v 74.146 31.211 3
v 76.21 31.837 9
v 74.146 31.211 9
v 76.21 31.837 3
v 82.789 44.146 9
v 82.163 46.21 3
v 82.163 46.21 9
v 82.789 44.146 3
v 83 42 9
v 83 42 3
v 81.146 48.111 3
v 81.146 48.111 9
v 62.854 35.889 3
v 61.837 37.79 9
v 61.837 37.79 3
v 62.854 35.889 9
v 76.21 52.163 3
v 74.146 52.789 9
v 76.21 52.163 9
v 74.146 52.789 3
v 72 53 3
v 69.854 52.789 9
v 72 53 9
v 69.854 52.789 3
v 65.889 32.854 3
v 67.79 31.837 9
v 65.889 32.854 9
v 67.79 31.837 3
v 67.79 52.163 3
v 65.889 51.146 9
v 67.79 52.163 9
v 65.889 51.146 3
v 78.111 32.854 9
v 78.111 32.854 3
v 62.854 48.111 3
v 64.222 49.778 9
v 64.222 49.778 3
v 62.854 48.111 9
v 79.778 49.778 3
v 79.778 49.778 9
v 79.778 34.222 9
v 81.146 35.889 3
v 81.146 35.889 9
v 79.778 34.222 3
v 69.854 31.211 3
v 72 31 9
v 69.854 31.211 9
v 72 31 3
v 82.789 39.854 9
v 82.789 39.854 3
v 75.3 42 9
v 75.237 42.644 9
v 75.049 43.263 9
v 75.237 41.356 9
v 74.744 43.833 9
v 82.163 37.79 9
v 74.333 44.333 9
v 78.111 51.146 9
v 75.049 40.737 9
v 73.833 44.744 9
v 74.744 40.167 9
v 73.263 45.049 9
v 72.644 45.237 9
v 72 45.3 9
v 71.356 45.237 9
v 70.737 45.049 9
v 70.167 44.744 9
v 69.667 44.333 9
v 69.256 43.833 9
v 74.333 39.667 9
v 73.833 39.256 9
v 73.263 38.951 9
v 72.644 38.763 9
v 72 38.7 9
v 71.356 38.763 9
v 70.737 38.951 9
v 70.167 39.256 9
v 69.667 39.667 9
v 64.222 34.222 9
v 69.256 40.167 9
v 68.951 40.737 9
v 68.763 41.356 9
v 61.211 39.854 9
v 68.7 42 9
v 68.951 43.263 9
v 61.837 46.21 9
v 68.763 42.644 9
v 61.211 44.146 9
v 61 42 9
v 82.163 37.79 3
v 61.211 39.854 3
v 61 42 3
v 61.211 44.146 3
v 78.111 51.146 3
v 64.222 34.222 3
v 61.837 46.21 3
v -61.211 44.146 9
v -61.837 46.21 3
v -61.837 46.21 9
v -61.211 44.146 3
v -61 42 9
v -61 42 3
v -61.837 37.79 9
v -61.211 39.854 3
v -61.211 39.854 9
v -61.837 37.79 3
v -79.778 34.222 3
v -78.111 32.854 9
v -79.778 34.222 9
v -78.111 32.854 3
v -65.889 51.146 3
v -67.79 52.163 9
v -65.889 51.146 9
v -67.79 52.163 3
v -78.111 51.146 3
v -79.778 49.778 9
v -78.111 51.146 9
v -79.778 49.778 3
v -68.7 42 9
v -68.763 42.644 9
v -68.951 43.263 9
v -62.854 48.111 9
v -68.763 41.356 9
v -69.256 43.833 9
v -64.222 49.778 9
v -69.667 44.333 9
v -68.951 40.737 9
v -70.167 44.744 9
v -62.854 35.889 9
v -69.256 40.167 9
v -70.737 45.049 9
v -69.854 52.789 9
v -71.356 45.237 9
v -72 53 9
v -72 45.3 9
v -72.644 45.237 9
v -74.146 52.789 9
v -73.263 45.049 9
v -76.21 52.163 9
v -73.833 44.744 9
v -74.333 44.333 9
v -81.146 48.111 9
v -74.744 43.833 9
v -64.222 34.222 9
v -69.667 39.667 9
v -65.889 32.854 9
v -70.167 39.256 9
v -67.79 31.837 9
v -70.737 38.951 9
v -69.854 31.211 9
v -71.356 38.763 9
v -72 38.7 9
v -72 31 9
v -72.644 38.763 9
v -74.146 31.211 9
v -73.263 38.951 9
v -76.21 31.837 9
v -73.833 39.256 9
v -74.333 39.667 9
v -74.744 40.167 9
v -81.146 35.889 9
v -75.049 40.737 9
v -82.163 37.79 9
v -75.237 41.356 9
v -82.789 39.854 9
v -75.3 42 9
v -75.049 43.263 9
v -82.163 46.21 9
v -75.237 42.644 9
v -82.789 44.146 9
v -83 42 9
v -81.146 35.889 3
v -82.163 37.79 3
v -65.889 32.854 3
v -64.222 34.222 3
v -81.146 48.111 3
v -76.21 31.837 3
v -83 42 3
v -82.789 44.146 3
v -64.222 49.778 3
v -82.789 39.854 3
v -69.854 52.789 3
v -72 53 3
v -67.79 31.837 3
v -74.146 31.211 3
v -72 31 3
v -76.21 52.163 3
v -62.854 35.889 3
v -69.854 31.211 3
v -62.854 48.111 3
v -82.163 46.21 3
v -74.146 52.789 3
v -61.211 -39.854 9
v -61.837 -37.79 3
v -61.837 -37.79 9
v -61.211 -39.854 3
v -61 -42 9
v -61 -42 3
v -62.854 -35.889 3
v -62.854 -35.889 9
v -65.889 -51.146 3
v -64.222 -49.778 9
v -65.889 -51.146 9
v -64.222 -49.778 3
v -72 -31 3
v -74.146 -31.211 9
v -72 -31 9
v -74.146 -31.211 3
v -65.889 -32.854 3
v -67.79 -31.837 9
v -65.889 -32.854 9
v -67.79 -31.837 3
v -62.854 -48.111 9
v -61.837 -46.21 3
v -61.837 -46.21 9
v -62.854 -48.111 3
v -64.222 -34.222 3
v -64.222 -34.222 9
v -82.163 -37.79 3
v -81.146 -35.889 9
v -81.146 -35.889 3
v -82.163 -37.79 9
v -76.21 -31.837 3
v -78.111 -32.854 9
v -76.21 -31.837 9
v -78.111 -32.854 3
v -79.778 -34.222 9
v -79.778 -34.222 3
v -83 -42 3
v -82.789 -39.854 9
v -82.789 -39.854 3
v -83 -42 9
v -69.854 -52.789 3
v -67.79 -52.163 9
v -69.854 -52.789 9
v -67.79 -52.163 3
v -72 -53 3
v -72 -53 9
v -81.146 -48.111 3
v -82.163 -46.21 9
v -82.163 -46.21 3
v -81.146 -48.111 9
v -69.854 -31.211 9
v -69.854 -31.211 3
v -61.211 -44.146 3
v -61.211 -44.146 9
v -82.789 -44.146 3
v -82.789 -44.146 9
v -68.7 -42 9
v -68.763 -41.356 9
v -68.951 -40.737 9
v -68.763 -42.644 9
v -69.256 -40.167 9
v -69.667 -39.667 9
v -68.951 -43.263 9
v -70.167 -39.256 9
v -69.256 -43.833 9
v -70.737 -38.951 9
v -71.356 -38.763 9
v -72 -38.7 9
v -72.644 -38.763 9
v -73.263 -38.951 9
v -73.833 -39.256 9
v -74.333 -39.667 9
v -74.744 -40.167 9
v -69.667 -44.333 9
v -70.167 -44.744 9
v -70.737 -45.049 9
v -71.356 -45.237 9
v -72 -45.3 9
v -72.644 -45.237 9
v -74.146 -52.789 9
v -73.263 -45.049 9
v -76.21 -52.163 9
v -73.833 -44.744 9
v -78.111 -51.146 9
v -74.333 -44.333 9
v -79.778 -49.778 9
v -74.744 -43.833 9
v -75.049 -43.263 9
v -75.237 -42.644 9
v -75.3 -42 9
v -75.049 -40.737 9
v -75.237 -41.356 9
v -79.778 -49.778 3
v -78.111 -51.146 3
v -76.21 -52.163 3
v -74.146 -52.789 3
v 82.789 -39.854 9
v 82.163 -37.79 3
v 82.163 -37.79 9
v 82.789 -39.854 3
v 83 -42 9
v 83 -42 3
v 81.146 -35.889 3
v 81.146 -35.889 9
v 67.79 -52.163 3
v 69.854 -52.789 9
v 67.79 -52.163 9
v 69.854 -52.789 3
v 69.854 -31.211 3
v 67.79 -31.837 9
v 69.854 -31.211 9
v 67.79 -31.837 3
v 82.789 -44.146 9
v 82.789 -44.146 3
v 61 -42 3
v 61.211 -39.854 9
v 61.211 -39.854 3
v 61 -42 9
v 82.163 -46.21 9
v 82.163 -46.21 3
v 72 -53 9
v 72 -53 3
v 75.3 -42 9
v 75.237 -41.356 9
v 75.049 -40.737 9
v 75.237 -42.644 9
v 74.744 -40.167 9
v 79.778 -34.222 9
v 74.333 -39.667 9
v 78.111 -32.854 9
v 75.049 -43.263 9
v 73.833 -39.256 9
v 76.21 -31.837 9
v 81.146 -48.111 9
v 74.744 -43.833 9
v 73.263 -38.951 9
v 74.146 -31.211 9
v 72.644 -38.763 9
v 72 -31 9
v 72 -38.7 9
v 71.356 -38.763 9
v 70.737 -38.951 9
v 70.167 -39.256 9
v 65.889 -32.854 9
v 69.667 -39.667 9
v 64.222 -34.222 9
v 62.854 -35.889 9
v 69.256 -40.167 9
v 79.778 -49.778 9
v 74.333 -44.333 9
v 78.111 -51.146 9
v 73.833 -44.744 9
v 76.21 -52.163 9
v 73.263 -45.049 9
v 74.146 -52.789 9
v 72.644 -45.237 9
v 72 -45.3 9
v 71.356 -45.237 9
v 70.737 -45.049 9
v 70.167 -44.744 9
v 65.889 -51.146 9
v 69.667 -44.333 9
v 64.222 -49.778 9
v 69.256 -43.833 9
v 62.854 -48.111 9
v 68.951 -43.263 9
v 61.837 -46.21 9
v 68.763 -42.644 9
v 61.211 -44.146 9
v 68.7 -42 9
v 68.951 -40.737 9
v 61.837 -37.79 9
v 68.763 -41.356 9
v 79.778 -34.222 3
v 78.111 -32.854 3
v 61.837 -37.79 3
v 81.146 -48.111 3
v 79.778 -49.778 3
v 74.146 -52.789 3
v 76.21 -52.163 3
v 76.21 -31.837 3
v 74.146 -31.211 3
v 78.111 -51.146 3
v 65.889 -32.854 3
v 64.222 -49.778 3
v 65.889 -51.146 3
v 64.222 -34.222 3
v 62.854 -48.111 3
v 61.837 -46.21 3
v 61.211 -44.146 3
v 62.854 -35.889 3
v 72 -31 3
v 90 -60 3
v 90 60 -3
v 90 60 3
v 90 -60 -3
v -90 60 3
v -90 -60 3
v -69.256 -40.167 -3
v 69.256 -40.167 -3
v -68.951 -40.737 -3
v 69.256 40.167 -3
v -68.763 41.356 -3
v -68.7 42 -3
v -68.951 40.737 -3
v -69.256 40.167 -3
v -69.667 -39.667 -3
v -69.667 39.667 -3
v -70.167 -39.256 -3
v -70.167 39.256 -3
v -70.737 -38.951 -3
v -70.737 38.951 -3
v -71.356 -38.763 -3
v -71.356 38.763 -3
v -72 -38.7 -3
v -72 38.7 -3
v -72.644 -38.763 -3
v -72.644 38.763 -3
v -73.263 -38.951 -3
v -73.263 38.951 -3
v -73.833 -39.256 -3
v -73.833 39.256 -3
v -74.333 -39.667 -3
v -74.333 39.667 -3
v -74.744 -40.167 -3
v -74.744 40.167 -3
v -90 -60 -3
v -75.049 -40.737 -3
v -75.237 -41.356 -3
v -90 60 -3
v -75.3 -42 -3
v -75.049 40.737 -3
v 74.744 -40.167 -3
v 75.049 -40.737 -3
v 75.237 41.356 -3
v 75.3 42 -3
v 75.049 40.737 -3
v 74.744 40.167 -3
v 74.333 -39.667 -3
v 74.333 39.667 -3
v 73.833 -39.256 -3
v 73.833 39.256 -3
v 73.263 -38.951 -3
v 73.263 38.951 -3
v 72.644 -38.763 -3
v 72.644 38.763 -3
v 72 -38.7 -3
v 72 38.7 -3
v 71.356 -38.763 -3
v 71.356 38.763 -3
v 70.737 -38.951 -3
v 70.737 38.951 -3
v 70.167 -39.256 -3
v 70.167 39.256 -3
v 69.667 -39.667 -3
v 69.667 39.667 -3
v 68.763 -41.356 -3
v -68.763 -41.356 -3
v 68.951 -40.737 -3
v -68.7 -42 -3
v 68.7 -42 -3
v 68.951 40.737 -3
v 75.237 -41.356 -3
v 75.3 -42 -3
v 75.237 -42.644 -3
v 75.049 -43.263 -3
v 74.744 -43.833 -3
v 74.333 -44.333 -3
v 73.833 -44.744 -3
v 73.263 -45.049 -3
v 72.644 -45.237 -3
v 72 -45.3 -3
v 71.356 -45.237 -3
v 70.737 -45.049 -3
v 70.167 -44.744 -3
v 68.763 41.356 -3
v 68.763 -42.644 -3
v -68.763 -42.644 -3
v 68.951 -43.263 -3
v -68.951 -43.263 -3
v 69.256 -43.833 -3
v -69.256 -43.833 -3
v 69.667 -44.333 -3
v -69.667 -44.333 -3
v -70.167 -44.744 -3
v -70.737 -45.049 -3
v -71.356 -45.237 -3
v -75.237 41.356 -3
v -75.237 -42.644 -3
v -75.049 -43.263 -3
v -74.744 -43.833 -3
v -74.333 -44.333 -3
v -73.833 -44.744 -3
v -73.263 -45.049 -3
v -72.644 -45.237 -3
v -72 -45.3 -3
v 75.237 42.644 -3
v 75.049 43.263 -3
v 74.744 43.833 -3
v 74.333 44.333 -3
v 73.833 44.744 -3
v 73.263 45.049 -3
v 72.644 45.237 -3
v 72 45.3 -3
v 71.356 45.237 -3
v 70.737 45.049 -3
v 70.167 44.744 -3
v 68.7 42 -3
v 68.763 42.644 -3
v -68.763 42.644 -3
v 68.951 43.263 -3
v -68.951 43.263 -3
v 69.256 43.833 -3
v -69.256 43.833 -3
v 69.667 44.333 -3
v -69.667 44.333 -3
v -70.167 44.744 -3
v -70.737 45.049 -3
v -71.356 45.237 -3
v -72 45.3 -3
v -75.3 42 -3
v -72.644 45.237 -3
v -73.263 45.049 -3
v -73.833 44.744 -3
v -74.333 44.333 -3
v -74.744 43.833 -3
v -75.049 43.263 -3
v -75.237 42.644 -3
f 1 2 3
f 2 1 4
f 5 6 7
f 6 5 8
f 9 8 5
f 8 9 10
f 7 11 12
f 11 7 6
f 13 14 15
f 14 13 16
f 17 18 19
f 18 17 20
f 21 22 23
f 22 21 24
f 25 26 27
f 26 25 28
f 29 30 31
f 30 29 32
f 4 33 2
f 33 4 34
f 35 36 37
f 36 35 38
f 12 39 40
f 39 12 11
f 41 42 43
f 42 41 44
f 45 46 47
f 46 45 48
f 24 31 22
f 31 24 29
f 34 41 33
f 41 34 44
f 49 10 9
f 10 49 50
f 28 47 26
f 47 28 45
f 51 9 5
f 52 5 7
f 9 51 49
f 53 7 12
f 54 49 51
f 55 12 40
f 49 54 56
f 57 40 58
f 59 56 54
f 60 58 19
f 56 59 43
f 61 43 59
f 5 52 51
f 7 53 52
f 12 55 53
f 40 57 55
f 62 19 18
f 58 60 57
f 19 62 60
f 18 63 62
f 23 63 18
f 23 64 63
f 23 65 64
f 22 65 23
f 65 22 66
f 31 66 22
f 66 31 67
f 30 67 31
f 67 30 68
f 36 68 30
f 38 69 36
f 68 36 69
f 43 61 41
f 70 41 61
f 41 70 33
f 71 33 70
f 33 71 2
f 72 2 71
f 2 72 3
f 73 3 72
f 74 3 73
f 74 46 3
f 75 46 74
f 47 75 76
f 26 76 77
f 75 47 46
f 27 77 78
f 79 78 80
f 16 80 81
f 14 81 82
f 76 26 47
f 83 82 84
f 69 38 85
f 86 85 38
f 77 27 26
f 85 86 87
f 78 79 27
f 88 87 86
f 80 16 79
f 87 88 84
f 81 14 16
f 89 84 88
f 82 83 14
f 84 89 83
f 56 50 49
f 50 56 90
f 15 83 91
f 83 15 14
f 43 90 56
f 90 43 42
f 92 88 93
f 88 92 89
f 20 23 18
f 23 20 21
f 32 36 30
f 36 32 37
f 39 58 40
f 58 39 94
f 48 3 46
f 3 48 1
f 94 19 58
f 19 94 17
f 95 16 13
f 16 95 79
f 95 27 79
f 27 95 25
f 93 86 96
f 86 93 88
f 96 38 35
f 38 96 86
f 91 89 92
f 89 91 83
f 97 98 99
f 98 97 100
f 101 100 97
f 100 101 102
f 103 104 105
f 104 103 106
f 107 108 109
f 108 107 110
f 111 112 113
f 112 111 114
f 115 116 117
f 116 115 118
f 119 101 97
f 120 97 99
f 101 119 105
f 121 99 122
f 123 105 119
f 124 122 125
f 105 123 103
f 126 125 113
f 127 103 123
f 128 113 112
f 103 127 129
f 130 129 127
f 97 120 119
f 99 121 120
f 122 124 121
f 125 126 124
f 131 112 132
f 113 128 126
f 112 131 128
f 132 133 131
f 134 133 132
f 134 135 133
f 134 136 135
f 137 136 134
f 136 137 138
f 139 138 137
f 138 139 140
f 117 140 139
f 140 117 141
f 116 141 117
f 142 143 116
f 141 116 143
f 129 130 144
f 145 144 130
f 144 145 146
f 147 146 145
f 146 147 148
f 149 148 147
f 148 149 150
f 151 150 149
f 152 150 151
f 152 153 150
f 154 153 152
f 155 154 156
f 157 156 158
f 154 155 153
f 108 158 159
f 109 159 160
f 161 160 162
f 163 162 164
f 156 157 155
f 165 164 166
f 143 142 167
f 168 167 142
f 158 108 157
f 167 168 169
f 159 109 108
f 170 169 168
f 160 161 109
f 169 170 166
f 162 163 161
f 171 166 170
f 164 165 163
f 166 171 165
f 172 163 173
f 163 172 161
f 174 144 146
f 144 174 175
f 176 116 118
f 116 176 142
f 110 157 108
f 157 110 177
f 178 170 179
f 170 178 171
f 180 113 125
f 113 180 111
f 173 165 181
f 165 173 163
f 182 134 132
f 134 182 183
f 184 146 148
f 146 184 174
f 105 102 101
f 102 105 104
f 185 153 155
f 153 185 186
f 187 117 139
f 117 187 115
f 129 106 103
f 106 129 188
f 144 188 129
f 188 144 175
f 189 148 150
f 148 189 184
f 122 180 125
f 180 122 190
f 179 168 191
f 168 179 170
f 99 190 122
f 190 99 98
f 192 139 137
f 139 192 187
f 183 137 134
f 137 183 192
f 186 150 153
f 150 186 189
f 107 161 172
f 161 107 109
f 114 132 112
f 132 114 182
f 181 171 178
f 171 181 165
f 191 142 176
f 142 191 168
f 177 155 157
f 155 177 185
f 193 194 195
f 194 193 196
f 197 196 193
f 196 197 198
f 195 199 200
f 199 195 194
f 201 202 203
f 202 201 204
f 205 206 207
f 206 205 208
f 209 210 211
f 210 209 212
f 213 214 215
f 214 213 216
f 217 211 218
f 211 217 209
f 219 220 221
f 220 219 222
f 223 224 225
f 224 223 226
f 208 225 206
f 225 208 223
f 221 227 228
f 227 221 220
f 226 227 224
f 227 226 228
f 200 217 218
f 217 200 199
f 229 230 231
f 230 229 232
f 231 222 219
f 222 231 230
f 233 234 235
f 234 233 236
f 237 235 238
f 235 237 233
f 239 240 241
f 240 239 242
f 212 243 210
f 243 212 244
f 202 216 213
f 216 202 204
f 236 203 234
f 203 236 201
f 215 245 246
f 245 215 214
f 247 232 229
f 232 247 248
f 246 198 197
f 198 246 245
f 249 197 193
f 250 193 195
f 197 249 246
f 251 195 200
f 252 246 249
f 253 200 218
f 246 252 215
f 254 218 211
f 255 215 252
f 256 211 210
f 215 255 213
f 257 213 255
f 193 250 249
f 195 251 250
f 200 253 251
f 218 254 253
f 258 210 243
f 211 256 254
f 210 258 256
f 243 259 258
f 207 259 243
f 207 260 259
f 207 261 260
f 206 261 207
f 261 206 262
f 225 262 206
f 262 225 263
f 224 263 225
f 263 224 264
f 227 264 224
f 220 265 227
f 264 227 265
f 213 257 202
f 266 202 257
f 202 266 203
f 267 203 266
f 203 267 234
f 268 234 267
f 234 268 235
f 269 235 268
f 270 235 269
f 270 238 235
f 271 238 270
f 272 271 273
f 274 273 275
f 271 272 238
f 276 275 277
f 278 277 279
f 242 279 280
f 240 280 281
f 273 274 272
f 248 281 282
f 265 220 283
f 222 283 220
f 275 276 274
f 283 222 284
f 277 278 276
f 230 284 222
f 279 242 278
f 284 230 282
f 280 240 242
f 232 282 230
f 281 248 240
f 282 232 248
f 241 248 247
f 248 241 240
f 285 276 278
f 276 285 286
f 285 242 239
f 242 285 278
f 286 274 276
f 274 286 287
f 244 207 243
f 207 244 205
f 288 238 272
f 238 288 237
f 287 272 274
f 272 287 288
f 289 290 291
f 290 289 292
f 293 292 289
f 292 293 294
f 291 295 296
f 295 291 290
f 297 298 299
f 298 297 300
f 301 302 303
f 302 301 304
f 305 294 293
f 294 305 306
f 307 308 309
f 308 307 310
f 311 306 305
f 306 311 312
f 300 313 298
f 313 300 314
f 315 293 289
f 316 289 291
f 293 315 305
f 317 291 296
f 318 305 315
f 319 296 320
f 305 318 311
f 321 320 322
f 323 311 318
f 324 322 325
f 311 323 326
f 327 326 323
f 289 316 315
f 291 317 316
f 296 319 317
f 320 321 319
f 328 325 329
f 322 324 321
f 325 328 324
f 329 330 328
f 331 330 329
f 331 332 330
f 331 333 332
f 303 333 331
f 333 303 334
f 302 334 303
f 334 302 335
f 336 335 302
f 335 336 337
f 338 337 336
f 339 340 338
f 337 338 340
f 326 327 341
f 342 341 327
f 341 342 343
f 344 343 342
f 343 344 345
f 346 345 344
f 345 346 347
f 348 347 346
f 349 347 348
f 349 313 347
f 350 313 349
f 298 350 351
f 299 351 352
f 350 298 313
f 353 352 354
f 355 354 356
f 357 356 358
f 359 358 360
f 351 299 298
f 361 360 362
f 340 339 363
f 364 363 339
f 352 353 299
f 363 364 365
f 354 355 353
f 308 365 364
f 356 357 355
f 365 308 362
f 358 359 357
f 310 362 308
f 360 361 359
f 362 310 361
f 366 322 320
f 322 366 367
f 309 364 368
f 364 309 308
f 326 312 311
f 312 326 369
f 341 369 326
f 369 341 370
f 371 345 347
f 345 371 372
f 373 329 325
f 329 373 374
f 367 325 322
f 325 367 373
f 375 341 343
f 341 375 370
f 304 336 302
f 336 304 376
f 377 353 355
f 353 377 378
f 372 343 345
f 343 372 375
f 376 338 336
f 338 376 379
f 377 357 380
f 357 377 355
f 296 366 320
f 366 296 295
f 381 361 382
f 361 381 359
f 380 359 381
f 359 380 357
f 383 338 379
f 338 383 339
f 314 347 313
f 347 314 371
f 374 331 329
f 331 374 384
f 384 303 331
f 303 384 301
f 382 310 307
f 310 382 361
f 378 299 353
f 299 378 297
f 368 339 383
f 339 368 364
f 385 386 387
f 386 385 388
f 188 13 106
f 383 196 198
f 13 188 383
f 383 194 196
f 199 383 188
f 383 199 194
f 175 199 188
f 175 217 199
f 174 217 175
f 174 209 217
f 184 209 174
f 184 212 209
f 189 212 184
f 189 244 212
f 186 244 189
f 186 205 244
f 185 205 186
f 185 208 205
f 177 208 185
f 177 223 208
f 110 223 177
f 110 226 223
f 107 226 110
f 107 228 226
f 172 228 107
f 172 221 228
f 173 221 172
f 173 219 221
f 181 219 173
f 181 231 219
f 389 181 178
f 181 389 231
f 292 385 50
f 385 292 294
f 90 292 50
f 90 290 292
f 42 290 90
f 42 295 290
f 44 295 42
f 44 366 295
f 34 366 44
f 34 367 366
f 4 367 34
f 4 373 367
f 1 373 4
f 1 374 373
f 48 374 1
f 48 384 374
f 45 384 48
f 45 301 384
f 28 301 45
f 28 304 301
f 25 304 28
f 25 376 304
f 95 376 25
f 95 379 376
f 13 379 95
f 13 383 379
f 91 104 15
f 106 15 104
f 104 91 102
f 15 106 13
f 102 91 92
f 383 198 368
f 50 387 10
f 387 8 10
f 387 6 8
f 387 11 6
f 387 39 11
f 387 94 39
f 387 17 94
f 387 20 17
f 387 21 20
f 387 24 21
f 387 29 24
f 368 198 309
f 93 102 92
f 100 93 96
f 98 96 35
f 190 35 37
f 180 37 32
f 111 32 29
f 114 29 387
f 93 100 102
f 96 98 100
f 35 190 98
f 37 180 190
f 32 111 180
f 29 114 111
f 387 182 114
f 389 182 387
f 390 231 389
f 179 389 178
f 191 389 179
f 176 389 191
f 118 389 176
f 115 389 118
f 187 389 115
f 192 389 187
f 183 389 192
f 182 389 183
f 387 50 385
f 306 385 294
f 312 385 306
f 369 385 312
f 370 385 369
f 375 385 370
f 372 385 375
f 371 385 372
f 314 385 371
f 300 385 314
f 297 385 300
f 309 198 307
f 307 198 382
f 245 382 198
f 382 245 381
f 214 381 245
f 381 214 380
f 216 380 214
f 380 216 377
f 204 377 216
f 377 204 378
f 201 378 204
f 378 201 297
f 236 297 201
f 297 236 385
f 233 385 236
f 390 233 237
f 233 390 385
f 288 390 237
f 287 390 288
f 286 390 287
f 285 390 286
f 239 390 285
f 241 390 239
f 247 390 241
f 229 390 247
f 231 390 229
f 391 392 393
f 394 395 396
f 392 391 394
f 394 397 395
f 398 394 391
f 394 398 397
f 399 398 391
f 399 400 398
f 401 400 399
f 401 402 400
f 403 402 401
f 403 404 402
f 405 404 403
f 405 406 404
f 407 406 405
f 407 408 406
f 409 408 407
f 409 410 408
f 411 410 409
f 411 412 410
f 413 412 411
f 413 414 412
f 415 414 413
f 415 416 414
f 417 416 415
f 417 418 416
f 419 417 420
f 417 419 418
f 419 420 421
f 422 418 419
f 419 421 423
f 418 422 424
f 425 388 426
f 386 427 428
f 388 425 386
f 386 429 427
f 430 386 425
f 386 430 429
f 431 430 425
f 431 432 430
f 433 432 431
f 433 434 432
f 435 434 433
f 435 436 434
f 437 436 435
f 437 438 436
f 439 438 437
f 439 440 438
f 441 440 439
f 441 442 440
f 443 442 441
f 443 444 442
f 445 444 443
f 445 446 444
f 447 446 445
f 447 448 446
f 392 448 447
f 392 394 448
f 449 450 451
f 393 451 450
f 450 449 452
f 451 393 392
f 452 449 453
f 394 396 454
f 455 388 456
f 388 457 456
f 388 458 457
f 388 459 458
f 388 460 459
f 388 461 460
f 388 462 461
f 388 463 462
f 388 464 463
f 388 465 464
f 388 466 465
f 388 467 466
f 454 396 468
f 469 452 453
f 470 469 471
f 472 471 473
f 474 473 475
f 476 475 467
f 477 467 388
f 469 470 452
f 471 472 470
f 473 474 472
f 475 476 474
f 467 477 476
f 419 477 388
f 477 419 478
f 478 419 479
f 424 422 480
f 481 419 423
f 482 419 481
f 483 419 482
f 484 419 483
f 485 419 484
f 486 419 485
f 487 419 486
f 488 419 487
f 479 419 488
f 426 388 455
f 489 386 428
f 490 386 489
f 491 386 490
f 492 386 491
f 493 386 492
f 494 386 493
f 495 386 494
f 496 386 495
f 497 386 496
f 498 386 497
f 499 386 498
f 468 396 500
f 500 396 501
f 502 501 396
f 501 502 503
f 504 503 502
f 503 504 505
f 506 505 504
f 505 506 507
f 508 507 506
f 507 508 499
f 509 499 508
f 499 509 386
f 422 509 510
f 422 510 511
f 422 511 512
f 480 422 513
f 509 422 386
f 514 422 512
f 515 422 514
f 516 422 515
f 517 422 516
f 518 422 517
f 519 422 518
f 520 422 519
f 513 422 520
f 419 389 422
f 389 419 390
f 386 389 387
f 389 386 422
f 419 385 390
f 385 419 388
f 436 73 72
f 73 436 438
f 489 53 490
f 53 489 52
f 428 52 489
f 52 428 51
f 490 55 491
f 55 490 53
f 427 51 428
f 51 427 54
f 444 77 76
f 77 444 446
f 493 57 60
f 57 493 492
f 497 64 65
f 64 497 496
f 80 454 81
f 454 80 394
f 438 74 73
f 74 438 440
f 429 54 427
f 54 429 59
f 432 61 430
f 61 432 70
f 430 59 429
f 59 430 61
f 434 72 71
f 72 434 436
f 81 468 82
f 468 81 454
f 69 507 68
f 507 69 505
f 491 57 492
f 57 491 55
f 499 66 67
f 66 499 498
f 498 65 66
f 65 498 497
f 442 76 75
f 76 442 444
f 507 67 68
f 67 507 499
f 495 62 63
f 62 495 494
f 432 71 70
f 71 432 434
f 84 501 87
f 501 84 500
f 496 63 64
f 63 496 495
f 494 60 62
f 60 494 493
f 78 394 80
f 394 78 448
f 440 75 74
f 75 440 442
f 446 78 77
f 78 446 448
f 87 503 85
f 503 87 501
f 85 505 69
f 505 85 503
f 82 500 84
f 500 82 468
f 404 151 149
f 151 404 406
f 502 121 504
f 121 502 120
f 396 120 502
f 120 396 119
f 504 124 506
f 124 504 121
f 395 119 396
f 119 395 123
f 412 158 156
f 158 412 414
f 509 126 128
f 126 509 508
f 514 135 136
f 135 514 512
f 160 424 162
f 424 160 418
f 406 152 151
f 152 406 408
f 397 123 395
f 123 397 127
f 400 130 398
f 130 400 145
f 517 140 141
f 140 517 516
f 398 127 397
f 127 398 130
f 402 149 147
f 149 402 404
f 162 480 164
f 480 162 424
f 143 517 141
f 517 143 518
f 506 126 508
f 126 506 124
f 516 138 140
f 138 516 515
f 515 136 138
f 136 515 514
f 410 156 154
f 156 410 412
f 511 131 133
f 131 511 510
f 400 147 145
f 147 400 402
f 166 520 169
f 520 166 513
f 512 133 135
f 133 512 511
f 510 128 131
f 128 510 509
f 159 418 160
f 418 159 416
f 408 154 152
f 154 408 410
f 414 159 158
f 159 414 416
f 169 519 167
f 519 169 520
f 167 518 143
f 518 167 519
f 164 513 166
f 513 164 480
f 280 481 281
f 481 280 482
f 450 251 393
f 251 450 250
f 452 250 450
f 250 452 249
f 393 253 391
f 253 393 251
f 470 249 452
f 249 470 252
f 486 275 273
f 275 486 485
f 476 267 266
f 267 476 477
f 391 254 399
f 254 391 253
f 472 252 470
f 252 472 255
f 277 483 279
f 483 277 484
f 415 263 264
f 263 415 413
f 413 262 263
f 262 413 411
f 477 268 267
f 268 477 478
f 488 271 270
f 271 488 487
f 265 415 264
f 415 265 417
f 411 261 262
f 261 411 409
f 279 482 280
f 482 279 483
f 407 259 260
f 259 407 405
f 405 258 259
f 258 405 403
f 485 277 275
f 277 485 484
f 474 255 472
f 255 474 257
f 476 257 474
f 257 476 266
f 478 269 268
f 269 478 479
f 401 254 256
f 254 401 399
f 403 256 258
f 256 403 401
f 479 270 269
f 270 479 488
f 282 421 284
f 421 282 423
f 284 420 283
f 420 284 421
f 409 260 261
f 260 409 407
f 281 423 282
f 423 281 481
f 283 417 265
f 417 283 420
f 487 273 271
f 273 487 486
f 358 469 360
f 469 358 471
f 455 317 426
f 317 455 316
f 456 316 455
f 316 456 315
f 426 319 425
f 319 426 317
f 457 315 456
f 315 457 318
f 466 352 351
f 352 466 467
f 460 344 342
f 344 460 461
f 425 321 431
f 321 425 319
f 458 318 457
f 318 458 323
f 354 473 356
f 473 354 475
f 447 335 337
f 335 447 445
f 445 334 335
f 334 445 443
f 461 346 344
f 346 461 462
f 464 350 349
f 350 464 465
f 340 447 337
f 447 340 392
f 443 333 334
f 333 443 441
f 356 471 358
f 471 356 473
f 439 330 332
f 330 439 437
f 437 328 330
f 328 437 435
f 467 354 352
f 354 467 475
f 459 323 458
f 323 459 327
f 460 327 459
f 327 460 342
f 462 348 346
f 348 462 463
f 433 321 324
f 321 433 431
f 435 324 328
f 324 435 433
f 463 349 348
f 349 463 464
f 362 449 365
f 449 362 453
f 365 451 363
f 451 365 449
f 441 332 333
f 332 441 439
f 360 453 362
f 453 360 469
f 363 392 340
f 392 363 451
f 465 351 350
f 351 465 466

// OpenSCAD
$fn = 32;

// ----------------------------------------------------------------------
// Anchor pads 180 x 120 x 12
// four corner bosses with anchor holes
// ----------------------------------------------------------------------

// --- parameters (mm) ---
plate = [180, 120, 6];  // base plate size (x, y, z)
pads = 4;               // boss count, one per corner
edge = 18;              // boss centre offset from the plate edge
boss_d = 22;            // boss diameter
boss_h = 6;             // boss height above the base plate
hole_d = 6.6;           // hole diameter

// --- derived feature positions (mm) ---
height = plate[2] + boss_h;      // = 12   overall height of the part
corner_x = plate[0] / 2 - edge;  // = 72   boss centre X
corner_y = plate[1] / 2 - edge;  // = 42   boss centre Y
feature_centers = [
  [corner_x, corner_y],
  [-corner_x, corner_y],
  [-corner_x, -corner_y],
  [corner_x, -corner_y]
];   // boss centres, anchor holes are drilled there

// base plate, four bosses standing on it, anchor holes all the way through
difference() {
  union() {
    cube(plate, center = true);
    for (centre = feature_centers)
      translate([centre[0], centre[1], plate[2] / 2 - 1])
        cylinder(d = boss_d, h = boss_h + 1);
  }
  for (centre = feature_centers)
    translate([centre[0], centre[1], -height])
      cylinder(d = hole_d, h = 2 * height + 2);  // through boss and plate
}
